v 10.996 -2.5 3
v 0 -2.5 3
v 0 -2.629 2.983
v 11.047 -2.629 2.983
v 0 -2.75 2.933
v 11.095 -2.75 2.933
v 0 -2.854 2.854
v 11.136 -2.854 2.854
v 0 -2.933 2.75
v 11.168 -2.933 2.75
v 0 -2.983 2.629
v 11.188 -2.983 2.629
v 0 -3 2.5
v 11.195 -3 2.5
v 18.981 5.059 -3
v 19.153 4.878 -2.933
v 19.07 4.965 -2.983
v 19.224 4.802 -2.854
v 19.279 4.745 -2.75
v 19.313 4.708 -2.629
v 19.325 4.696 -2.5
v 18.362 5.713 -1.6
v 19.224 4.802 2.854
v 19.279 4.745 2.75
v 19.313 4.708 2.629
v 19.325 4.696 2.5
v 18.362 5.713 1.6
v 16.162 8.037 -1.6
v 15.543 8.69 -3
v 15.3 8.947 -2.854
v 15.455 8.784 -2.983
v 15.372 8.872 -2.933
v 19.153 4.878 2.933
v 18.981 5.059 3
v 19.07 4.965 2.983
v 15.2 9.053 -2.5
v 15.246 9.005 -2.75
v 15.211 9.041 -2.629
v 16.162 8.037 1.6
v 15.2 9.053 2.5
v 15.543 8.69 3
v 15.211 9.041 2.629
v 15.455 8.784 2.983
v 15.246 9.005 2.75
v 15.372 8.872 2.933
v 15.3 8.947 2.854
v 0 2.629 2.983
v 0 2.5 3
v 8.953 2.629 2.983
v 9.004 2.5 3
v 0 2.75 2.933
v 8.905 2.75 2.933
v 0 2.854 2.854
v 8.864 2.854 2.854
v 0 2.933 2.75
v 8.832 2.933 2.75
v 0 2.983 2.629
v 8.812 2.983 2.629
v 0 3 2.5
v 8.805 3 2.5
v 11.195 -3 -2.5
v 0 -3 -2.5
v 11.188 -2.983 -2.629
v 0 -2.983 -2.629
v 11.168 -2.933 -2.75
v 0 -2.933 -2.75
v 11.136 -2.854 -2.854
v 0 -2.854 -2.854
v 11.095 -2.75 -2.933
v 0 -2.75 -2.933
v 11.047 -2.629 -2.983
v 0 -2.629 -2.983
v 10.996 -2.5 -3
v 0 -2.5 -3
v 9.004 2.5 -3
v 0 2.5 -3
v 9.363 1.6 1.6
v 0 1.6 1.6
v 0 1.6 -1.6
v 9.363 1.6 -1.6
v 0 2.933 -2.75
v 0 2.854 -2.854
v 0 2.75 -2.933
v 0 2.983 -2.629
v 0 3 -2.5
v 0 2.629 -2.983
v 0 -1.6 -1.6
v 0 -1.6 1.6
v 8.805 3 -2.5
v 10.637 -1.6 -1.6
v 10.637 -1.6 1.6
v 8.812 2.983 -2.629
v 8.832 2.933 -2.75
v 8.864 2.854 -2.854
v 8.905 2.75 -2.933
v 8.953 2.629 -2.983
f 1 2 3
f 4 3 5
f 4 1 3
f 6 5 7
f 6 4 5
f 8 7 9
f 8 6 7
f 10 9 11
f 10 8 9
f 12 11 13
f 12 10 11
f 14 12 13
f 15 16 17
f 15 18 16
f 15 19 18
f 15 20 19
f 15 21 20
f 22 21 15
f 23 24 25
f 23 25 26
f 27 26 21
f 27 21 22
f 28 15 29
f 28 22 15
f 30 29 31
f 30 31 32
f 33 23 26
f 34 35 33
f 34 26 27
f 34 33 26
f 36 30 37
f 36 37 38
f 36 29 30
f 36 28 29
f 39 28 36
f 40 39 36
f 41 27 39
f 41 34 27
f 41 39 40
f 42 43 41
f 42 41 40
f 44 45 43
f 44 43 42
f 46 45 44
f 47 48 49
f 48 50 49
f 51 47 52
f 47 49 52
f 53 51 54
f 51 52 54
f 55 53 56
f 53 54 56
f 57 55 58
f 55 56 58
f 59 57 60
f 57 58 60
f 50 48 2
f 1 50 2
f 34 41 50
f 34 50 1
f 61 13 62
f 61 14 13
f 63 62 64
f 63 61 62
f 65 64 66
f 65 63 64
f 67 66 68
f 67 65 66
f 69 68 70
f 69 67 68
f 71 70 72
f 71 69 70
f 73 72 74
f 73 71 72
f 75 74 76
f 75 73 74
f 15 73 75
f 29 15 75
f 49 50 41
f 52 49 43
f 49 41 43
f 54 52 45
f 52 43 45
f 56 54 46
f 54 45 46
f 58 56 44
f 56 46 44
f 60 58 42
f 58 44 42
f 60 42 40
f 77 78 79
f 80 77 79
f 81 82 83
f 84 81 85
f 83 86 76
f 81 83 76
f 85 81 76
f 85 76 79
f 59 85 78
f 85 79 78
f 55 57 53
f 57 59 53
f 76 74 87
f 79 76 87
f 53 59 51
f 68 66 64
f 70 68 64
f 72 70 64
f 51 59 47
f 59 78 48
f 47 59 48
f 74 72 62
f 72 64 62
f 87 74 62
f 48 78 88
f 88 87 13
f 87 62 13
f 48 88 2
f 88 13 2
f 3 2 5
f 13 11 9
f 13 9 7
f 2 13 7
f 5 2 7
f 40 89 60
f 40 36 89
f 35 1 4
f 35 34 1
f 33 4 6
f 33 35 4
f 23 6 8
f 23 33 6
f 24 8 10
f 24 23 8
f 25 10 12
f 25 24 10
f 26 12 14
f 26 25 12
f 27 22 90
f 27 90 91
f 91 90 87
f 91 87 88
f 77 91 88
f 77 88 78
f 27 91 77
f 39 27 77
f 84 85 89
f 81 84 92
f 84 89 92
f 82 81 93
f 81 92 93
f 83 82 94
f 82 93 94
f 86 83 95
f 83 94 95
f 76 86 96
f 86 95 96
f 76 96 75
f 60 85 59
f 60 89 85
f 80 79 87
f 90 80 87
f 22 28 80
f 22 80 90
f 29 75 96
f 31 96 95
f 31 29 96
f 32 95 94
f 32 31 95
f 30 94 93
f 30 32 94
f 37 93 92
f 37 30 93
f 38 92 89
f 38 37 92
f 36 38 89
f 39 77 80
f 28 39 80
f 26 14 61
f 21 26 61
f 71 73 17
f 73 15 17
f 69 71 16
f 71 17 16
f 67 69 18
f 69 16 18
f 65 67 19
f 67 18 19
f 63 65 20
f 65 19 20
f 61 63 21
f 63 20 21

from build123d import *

# Parameters (mm, degrees)
SKETCH3_W   = 6
SKETCH3_H   = 6
SKETCH3_W_2 = 3.2
SKETCH3_H_2 = 3.2
FILLET1_R   = 0.5


with BuildPart() as part:
    # Sweep1: sweep along a path in Sketch2
    with BuildLine(Plane.XY) as sweep1_path:
        Line((0, 0), (10, 0))
        Line((10, 0), (17.262148132, 6.874678502))
    # Sketch3 → Sweep1 (sweep)
    with BuildSketch(Plane(origin=(0, 0, 0), x_dir=(0, 0, -1), z_dir=(1, 0, 0))):
        Rectangle(SKETCH3_W, SKETCH3_H)
        Rectangle(SKETCH3_W_2, SKETCH3_H_2, mode=Mode.SUBTRACT)
    sweep(path=sweep1_path.line, transition=Transition.RIGHT)

    # Fillet1
    fillet1_edges = [part.edges().sort_by_distance(p)[0] for p in [
        (5.597377434, -3, 3),
        (4.402622566, 3, 3),
        (4.402622566, 3, -3),
        (5.597377434, -3, -3),
        (15.259653275, 0.848017031, -3),
        (12.002494857, 6.026661471, -3),
        (12.002494857, 6.026661471, 3),
        (15.259653275, 0.848017031, 3),
    ]]
    fillet(fillet1_edges, radius=FILLET1_R)


solid = part.part
